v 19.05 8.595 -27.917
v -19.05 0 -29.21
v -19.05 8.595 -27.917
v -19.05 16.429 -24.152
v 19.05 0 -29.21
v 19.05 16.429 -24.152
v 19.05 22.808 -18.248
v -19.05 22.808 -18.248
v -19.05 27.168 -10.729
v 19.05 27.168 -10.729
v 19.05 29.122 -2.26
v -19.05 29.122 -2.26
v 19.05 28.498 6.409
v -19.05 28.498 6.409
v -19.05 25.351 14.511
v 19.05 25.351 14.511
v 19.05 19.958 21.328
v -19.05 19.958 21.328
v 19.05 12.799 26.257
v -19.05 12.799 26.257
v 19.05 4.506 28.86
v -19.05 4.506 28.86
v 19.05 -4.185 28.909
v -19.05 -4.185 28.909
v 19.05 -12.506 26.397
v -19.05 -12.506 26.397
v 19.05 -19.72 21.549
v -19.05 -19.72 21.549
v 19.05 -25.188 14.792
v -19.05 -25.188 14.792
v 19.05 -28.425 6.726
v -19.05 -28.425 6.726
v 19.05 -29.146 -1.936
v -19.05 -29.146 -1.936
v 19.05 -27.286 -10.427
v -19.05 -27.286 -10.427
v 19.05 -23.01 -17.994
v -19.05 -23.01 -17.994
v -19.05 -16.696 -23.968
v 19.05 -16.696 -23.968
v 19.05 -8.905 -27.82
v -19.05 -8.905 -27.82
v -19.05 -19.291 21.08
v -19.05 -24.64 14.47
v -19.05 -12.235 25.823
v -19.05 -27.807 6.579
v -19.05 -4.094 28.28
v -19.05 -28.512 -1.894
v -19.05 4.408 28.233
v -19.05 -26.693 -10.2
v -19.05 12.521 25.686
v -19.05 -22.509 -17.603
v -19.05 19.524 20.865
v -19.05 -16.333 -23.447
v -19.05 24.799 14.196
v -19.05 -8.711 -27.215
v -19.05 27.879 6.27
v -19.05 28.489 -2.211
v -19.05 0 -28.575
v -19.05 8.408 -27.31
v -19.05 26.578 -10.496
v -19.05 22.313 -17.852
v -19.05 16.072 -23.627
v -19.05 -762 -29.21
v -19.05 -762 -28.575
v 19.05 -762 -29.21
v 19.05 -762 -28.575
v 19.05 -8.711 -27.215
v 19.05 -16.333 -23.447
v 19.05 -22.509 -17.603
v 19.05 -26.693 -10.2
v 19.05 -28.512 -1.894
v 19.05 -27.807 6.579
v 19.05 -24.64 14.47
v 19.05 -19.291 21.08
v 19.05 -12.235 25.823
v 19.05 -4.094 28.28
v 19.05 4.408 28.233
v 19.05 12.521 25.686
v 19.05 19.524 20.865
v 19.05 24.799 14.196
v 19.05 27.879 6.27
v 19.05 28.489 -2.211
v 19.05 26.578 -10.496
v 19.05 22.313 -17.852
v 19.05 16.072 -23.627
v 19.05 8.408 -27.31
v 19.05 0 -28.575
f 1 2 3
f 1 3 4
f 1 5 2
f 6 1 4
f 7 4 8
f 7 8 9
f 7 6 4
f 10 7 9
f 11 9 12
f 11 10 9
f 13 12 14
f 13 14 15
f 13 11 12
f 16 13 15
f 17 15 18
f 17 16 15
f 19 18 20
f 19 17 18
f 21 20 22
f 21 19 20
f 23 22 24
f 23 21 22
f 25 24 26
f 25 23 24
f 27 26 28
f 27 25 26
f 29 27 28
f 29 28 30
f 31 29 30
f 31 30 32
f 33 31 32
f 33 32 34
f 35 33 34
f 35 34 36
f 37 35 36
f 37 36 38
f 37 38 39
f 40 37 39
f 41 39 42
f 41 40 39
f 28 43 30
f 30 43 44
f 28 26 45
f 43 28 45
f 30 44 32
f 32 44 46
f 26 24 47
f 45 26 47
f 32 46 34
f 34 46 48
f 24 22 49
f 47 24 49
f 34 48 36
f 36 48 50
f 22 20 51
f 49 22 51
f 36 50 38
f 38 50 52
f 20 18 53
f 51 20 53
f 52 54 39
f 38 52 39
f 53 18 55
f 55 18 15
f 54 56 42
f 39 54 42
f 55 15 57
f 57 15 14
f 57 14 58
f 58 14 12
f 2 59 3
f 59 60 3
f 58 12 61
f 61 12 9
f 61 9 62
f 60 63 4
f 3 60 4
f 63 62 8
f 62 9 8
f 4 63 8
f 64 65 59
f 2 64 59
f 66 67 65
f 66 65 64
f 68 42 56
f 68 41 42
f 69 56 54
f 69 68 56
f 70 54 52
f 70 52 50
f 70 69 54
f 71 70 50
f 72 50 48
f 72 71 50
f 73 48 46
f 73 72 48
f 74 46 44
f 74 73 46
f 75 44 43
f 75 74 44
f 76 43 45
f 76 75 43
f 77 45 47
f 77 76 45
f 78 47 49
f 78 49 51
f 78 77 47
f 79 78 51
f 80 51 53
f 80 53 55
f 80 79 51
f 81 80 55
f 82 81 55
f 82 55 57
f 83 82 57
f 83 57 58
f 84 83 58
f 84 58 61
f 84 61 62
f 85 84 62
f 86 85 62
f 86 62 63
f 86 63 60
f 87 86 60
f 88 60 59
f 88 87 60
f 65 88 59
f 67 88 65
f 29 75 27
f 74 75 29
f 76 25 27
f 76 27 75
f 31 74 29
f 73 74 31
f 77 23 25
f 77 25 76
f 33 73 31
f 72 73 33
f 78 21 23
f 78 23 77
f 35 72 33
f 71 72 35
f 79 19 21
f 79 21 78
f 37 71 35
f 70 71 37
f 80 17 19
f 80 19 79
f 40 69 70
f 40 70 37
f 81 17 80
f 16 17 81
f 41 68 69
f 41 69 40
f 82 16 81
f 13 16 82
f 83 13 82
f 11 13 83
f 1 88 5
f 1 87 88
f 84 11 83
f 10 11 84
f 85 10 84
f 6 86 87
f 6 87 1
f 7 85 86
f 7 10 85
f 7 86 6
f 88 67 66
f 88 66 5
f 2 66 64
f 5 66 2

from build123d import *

# Parameters (mm, degrees)
EXTRUDE_THIN2_DEPTH = 19.05


with BuildPart() as part:
    # Sketch1 → Extrude-Thin2 (new body, symmetric)
    with BuildSketch(Plane(origin=(0, 0, 0), x_dir=(0, 0, -1), z_dir=(1, 0, 0))):
        with BuildLine():
            ThreePointArc((27.214858383, -8.711033705), (-28.232916988, 4.408290299), (28.575, 0))
            Line((28.575, 0), (28.575, -762))
            Line((28.575, -762), (29.21, -762))
            Line((29.21, -762), (29.21, 0))
            ThreePointArc((29.21, 0), (-28.860315143, 4.506252306), (27.819633013, -8.904612232))
            Line((27.819633013, -8.904612232), (27.214858383, -8.711033705))
        make_face()
    extrude(amount=EXTRUDE_THIN2_DEPTH, both=True)


solid = part.part
